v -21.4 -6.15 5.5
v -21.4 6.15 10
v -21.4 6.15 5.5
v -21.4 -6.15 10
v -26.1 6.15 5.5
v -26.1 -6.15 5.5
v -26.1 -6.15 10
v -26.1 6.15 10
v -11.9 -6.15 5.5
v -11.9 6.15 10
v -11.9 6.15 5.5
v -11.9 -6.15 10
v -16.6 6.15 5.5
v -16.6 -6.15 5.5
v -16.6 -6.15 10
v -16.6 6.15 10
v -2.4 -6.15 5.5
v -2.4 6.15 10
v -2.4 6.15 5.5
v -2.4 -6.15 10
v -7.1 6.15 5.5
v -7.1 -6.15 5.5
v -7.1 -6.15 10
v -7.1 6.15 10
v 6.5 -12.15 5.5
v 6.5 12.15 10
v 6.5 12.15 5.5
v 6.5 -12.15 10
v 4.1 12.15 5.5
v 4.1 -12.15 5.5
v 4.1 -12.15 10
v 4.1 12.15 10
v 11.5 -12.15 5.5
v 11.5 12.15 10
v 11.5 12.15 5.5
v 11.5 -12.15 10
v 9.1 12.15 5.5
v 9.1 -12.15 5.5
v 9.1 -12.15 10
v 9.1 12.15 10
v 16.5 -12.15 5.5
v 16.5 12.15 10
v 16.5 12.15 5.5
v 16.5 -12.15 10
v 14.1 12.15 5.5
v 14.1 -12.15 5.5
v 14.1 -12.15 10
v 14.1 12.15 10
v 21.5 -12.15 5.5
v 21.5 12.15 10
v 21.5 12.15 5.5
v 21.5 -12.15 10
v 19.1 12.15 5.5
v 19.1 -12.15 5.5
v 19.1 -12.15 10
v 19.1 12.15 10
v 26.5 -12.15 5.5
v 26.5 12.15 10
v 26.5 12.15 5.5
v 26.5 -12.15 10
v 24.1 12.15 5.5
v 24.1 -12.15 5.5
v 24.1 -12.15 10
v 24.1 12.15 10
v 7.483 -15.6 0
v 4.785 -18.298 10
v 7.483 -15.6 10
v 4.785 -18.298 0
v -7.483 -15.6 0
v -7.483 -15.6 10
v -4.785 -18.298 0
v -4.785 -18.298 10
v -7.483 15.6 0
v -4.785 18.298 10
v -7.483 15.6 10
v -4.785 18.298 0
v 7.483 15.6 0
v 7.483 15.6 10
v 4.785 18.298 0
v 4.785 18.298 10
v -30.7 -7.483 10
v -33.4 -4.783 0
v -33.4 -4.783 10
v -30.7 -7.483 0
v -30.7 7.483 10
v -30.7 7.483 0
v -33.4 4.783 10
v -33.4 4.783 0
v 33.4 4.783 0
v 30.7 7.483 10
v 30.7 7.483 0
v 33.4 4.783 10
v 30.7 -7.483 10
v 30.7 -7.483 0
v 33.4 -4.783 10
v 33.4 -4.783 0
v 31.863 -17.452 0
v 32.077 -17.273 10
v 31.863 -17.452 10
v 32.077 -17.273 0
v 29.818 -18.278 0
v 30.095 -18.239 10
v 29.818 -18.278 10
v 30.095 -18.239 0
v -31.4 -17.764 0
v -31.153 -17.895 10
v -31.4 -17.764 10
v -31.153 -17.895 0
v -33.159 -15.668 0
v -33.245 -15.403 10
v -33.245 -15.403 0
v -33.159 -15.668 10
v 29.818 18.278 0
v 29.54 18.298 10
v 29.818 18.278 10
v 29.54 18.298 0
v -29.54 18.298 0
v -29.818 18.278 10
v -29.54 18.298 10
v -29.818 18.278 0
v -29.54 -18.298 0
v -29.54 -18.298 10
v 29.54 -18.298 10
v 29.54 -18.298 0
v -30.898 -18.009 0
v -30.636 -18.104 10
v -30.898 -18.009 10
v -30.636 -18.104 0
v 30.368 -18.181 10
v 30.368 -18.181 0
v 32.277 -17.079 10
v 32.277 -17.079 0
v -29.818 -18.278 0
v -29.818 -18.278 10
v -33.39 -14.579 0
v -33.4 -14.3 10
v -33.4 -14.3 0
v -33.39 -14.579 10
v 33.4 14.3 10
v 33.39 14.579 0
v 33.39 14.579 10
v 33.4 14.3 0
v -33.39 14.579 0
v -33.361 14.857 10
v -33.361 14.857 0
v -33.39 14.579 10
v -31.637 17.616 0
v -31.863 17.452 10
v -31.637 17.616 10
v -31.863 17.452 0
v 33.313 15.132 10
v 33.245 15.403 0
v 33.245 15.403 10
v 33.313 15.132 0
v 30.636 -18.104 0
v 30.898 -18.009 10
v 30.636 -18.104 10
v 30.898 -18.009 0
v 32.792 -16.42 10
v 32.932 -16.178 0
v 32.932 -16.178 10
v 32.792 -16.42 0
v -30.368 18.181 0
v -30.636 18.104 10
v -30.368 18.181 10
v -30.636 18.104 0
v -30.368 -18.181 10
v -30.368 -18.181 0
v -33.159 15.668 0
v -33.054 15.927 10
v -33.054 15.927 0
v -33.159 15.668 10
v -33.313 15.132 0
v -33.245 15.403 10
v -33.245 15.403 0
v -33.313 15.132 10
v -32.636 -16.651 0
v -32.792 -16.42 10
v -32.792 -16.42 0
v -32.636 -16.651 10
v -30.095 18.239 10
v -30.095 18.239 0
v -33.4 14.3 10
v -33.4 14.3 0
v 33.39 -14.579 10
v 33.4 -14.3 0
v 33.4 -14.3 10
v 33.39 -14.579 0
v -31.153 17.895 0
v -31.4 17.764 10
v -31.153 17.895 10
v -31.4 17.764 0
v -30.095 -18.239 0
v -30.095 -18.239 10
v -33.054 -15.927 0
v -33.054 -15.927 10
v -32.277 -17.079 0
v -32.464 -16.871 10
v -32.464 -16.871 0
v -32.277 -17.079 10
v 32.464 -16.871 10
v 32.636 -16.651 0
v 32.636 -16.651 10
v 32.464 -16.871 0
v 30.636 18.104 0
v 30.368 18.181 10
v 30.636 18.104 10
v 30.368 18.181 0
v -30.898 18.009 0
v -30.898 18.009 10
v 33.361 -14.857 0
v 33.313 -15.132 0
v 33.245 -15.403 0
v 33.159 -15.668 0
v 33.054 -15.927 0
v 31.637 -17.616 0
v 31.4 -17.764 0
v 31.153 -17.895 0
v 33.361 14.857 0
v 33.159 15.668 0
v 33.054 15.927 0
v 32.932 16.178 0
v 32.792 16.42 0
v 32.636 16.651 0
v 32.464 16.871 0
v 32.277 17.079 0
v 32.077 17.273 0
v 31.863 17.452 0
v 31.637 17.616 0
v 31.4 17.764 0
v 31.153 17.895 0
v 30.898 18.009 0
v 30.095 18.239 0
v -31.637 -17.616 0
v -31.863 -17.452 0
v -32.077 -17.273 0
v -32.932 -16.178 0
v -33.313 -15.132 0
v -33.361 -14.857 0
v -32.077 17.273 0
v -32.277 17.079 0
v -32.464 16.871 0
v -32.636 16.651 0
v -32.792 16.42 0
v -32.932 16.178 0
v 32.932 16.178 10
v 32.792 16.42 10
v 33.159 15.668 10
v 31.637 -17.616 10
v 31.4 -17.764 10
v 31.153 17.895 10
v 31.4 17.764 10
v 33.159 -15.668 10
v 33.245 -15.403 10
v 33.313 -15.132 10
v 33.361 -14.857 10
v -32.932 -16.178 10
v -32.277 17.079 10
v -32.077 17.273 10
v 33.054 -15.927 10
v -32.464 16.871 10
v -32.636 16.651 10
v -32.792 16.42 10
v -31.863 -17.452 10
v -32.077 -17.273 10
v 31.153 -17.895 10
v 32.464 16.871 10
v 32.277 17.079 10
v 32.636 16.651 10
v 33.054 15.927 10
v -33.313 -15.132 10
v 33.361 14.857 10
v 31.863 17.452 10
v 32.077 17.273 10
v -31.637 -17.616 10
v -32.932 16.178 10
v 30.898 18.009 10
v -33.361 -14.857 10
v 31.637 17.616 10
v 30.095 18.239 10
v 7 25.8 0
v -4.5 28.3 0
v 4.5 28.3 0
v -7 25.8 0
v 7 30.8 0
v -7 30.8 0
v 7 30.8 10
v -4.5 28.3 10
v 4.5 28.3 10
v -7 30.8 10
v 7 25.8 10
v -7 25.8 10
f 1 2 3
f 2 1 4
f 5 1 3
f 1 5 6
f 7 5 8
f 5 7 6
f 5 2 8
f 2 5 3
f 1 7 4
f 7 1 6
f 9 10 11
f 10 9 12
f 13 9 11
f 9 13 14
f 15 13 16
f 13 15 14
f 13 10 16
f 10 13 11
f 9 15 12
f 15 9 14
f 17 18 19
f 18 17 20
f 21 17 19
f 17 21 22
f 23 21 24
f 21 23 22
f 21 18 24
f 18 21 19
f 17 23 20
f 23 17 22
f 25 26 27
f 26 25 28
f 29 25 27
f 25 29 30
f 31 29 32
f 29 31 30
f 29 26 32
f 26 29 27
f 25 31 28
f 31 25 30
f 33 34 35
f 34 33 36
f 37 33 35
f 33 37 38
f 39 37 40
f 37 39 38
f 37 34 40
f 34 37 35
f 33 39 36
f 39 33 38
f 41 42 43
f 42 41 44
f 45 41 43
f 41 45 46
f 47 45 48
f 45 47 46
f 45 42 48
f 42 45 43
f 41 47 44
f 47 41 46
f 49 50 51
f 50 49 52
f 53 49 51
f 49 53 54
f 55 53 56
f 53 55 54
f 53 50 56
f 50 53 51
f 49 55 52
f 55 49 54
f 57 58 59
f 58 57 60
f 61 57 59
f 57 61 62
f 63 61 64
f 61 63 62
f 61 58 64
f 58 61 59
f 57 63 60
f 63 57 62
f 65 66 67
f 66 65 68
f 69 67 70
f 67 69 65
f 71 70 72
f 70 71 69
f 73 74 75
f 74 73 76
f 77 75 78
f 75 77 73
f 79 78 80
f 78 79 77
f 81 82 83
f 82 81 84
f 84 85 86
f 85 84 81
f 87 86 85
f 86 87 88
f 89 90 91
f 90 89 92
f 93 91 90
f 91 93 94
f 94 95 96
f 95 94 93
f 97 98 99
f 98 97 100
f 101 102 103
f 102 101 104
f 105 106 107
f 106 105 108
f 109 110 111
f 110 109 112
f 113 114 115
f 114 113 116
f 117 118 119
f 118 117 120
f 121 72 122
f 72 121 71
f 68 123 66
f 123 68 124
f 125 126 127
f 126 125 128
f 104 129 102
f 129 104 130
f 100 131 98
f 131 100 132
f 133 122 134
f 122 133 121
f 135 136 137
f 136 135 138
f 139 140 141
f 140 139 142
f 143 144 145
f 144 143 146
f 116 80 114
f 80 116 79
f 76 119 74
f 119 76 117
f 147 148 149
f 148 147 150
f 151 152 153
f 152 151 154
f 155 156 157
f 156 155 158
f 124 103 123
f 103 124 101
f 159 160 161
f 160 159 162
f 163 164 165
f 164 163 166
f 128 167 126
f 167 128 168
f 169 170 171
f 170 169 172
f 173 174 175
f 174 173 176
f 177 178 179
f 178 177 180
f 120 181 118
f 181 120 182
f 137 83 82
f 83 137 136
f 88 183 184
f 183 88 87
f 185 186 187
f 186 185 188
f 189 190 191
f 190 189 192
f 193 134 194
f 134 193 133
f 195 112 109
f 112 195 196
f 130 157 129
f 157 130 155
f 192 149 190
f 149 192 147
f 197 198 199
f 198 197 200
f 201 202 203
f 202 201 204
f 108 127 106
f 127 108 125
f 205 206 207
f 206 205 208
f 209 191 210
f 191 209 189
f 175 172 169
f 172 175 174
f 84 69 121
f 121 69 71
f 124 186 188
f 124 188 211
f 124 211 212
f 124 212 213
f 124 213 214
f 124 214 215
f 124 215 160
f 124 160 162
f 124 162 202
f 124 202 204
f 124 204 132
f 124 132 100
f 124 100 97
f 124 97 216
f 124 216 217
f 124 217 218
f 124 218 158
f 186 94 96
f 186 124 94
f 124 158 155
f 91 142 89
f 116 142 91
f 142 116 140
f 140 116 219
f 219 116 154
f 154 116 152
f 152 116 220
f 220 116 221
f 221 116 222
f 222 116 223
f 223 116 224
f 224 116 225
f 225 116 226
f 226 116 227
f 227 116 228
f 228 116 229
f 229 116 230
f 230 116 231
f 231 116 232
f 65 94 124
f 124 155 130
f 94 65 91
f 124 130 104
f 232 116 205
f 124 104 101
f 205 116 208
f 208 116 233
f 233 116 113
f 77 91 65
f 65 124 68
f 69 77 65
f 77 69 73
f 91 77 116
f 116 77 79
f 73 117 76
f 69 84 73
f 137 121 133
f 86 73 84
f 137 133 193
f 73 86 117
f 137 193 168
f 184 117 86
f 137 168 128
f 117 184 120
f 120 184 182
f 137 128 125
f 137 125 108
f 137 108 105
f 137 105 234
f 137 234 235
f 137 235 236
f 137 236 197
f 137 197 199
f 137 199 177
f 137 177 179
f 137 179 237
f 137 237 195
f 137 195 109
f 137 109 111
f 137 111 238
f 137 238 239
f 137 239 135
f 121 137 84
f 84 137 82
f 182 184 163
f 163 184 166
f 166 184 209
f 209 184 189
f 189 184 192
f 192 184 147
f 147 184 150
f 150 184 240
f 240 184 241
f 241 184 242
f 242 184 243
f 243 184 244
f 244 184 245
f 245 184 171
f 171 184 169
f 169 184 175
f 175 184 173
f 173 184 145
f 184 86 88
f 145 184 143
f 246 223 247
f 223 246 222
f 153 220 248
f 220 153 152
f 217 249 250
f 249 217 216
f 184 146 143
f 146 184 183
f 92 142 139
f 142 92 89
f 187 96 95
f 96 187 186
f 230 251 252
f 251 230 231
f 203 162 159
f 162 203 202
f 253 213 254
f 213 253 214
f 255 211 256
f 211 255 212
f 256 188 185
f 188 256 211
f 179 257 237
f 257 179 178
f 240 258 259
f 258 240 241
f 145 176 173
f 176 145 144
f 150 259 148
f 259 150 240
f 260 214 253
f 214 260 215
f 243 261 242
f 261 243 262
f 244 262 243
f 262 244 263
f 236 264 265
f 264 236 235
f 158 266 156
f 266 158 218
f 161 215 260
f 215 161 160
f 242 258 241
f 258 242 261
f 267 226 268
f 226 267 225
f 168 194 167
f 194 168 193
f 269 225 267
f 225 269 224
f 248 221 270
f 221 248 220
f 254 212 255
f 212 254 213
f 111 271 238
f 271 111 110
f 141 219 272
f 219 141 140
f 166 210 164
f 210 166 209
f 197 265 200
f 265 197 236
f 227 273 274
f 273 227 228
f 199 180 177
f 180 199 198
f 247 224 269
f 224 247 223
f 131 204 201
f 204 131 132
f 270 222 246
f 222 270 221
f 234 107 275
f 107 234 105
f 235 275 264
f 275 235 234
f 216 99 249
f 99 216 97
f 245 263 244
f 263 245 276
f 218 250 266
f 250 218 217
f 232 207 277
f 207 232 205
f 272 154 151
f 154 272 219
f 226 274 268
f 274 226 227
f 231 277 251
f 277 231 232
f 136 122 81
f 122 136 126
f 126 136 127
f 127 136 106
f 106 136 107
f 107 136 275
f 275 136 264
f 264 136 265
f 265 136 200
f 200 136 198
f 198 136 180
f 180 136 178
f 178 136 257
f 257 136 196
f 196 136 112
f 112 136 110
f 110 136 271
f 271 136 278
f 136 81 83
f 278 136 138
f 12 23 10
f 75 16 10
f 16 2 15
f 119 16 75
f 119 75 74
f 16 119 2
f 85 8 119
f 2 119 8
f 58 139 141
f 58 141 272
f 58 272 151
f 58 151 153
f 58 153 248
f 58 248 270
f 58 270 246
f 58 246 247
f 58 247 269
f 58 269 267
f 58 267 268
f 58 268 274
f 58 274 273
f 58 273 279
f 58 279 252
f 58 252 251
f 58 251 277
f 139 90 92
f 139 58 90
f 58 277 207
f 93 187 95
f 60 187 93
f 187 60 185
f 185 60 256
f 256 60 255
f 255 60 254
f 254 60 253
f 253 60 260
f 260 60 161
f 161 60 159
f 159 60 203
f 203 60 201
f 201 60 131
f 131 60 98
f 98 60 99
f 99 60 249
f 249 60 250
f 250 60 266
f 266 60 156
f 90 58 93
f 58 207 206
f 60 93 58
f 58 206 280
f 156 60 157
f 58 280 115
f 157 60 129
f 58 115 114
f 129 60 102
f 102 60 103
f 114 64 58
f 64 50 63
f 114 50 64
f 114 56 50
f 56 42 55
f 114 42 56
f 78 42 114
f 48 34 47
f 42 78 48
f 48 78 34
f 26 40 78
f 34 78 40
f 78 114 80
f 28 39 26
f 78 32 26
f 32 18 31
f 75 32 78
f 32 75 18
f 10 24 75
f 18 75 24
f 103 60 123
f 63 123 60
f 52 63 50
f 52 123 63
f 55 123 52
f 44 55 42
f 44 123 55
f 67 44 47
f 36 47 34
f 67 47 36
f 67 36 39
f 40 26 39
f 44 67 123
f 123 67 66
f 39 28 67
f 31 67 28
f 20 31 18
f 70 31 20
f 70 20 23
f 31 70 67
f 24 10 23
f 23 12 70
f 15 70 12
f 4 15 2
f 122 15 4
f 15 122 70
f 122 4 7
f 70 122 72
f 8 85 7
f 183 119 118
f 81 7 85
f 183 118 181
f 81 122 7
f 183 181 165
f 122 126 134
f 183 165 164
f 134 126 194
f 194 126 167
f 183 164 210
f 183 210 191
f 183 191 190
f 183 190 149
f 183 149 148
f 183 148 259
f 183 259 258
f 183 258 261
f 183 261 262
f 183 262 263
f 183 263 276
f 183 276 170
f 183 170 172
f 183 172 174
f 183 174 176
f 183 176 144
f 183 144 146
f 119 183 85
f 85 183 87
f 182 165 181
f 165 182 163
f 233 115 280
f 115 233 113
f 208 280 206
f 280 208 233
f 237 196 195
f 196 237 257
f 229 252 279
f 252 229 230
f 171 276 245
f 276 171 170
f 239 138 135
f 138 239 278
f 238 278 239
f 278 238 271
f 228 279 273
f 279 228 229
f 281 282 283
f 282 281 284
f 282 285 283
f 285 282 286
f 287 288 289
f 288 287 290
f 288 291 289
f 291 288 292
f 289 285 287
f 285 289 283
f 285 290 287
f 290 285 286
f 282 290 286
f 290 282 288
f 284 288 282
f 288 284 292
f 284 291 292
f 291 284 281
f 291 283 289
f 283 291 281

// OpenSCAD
// initial design from :
// http://www.thingiverse.com/thing:48235

// modified by Bertrand MAUBERT oct 2016 (add padding space, add optionnal connectors).
// add code for SD Card, USB key


// battery diameter (AA-14.5, AAA-10.6 123A-16.8 CR2-15.5)
_diameter = 14.5;

// height of the tray;
_height = 10; // [1:80]

// number of battery clusters across
_columns = 2; // [1:12]

// number of battery clusters deep
_rows = 1; // [1:12]

// padding between the clusters of batteries (also affects padding along the edges)
_spacing = 1.2;

// thickness of the base under the batteries
_base = 0.5;

// radius of corner rounding
_cornerRounding = 4.0;

// added by BM 
// extra space (add padding along the edges)
_padding = 2;

// dimensions of connector
WITH_CONNECTOR = true ;
_con_x = 7; 
_con_y = 2.5;
_con_z = 10;
_offset = 0.2; // spacing for the connector

// CON_PATTERN : // possible values : 
// "middle_of_tray", "middle of quad"
CON_PATTERN = "middle_of_tray" ; 

// choose only one of type of holes.
FOR_BATTERIES = false ;
FOR_USB = false ; 
FOR_USB_AND_SD = true ;

half_depth = _padding + ((2 * _diameter + _spacing) * _rows + _spacing*2)/2;
half_width = _padding + ((2 * _diameter + _spacing) * _columns + _spacing*2)/2;

module batteryQuad(diameter, height) {
	angle = 35;
	r = diameter/2;
	cut = 2*r*sin(angle);
	tan = tan(angle);
	filletCenter = r - r * tan;
	filletCenter2 = r + r * tan;
	filletOffset = r * tan;
	filletRadius = r/cos(angle) - r;

	eps = 0.1;

	difference() {
		union() {
			for (x=[-r,r]) {
				for (y=[-r,r]) {
					translate([x,y,0]) {
						cylinder(r=r, h=height, center=true);
					}
				}
			}
			for (t=[ [ r, 0, 0],
					[-r, 0, 0],
					[ 0, r, 0],
					[ 0,-r, 0] ]) {
				translate(t) {
					cube(size=[cut,cut,height], center=true);
				}
			}
		}
		// round
		for (z=[0:90:270]) {
			rotate([0,0,z]) {
				for(y=[filletOffset, -filletOffset]) {
					translate([0, r+y,0]) {
						cylinder(r=filletRadius, h=height+eps, center=true, $fn=30);
					}
				}	
			}
		}
	}
}

module USBHoleMalePartOnly(depth=10){
    width = 2.7 ;
    length = 12.2 ;
    translate([width/2, 0, depth/2])
    cube([width, length,  depth], center=true);
}

module USBHole(depth=10){
    width = 4.5+0.2 ;
    length = 12.1+0.2;
    translate([width/2, 0, depth/2])
    cube([width, length,  depth], center=true);
}
// for USB key
module usbHoles(){
    delta = 9.5 ;            
    make_group_of(3, delta){
        USBHole();
    }    
}

module SDHole(depth=10){
    width = 2.2 +0.2 ;
    length = 24.1 + 0.2 ;
    translate([width/2, 0, depth/2])
    cube([width, length,  depth], center=true);
}

module SDHoles(){
    delta = 5 ;        
    make_group_of(5, delta){
        SDHole();
    }    
}

module make_group_of(count, space){
    for ( i = [0 : count-1]){
    translate([ i * space,0,0]) children();}
}

module makeTray(diameter, height, rows, columns, spacing, base, rounding, padding) {
	eps = 0.1;
	rounding = min(rounding, diameter/2 + spacing*2);
	quadSize = 2 * diameter;
	width = (quadSize + spacing) * columns + spacing*2;
	depth = (quadSize + spacing) * rows + spacing*2;
	xstart = -width/2 + spacing*1.5 + quadSize/2;
	ystart = -depth/2 + spacing*1.5 + quadSize/2;

	difference() {
        // main block
		hull()
		for (x=[-padding - width/2 + rounding, 
            + padding + width/2 - rounding])
		for (y=[-padding - depth/2 + rounding, 
            + padding + depth/2 - rounding]) {
			translate([x,y])
			cylinder(r=rounding, h=height);
		}
        // holes for batterie
        if (FOR_BATTERIES){
		  translate([0,0,height/2 + base]) {
			for (x=[0:1:columns-1])
			for (y=[0:1:rows-1]) {
				translate([xstart + (quadSize + spacing)*x,
							 ystart + (quadSize + spacing)*y,0]) {
					batteryQuad(diameter, height);
				}
			}
		  }
        }
         if (FOR_USB){
		  translate([0,0,height/2 + base]) {
			for (x=[0:1:columns-1])
			for (y=[0:1:rows-1]) {
				translate([-11 + xstart + (quadSize + spacing)*x,
							 -0 + ystart + (quadSize + spacing)*y,0]) {
					usbHoles(depth);
				}
			}
		  }
        }
          if (FOR_USB_AND_SD){
		  translate([0,0,height/2 + base]) {
			// for (x=[0:1:columns-1])
            x = 0 ;
            echo(x);   
			for (y=[0:1:rows-1]) {
				translate([-11 + xstart + (quadSize + spacing)*0,
							 -0 + ystart + (quadSize + spacing)*y,0]) {
					usbHoles(depth);
				}
			}
            x = 1 ;
            echo(x);
            for (y=[0:1:rows-1]) {
				translate([-11 + xstart + (quadSize + spacing)*x,
							 -0 + ystart + (quadSize + spacing)*y,0]) {
					SDHoles(depth);
				}
			}
		  }
        }        
        // Spaces for connectors
        if  (WITH_CONNECTOR) 
            spacesForConnectors();
	    }
}

module connector2D(){
        polygon([
    [-_con_x,_con_y], [_con_x, _con_y], [_con_x-_con_y,0],  
    [_con_x, -_con_y], [-_con_x, -_con_y],[-_con_x+_con_y , 0]]);
    }
module connector(){
    linear_extrude(height=_con_z)
    connector2D();
    }
module spaceForConnector(){
    translate([0,0,-0.1])
    linear_extrude(height=_con_z + 0.5)
    offset(delta = _offset){
    connector2D();
   }
}

module spacesForConnectors(){
    // draw several spaces for connectors.
    if (CON_PATTERN == "middle_of_tray"){    
    // echo("middle of tray");
    for ( y = [ - half_depth, half_depth]){
        translate([0,y,0])
        spaceForConnector();
    }
    for ( x = [ - half_width, half_width]){
        translate([x,0,0])
        rotate([0,0,90])
        spaceForConnector();
    }
    }
    else if (CON_PATTERN == "middle_of_quad"){
       // _rows, 
        QW = (half_width*2)/_columns ; // Quad width
        eps = 0.01;
        %for ( y = [-half_depth, half_depth]){  
            for ( x=[-half_width+(QW/2):QW:eps+half_width-(QW/2)]){
            echo(x ); 
            translate([x,y,0]) 
            spaceForConnector();
            }

            for ( x = [ -half_width, half_width])
                for (y = [-half_depth+(QW/2):QW:eps+half_depth-(QW/2)]  ){
                translate([x,y,0])
                rotate([0,0,90])
                spaceForConnector();
            }
    
        }
    }    
    else{
        echo ("Hein ?");
    }
}


// Main
makeTray(_diameter, _height, _rows, _columns, _spacing, _base, _cornerRounding, _padding, $fn=90);

if  (WITH_CONNECTOR) 
    translate([0,half_depth + 10,0])
    connector();
